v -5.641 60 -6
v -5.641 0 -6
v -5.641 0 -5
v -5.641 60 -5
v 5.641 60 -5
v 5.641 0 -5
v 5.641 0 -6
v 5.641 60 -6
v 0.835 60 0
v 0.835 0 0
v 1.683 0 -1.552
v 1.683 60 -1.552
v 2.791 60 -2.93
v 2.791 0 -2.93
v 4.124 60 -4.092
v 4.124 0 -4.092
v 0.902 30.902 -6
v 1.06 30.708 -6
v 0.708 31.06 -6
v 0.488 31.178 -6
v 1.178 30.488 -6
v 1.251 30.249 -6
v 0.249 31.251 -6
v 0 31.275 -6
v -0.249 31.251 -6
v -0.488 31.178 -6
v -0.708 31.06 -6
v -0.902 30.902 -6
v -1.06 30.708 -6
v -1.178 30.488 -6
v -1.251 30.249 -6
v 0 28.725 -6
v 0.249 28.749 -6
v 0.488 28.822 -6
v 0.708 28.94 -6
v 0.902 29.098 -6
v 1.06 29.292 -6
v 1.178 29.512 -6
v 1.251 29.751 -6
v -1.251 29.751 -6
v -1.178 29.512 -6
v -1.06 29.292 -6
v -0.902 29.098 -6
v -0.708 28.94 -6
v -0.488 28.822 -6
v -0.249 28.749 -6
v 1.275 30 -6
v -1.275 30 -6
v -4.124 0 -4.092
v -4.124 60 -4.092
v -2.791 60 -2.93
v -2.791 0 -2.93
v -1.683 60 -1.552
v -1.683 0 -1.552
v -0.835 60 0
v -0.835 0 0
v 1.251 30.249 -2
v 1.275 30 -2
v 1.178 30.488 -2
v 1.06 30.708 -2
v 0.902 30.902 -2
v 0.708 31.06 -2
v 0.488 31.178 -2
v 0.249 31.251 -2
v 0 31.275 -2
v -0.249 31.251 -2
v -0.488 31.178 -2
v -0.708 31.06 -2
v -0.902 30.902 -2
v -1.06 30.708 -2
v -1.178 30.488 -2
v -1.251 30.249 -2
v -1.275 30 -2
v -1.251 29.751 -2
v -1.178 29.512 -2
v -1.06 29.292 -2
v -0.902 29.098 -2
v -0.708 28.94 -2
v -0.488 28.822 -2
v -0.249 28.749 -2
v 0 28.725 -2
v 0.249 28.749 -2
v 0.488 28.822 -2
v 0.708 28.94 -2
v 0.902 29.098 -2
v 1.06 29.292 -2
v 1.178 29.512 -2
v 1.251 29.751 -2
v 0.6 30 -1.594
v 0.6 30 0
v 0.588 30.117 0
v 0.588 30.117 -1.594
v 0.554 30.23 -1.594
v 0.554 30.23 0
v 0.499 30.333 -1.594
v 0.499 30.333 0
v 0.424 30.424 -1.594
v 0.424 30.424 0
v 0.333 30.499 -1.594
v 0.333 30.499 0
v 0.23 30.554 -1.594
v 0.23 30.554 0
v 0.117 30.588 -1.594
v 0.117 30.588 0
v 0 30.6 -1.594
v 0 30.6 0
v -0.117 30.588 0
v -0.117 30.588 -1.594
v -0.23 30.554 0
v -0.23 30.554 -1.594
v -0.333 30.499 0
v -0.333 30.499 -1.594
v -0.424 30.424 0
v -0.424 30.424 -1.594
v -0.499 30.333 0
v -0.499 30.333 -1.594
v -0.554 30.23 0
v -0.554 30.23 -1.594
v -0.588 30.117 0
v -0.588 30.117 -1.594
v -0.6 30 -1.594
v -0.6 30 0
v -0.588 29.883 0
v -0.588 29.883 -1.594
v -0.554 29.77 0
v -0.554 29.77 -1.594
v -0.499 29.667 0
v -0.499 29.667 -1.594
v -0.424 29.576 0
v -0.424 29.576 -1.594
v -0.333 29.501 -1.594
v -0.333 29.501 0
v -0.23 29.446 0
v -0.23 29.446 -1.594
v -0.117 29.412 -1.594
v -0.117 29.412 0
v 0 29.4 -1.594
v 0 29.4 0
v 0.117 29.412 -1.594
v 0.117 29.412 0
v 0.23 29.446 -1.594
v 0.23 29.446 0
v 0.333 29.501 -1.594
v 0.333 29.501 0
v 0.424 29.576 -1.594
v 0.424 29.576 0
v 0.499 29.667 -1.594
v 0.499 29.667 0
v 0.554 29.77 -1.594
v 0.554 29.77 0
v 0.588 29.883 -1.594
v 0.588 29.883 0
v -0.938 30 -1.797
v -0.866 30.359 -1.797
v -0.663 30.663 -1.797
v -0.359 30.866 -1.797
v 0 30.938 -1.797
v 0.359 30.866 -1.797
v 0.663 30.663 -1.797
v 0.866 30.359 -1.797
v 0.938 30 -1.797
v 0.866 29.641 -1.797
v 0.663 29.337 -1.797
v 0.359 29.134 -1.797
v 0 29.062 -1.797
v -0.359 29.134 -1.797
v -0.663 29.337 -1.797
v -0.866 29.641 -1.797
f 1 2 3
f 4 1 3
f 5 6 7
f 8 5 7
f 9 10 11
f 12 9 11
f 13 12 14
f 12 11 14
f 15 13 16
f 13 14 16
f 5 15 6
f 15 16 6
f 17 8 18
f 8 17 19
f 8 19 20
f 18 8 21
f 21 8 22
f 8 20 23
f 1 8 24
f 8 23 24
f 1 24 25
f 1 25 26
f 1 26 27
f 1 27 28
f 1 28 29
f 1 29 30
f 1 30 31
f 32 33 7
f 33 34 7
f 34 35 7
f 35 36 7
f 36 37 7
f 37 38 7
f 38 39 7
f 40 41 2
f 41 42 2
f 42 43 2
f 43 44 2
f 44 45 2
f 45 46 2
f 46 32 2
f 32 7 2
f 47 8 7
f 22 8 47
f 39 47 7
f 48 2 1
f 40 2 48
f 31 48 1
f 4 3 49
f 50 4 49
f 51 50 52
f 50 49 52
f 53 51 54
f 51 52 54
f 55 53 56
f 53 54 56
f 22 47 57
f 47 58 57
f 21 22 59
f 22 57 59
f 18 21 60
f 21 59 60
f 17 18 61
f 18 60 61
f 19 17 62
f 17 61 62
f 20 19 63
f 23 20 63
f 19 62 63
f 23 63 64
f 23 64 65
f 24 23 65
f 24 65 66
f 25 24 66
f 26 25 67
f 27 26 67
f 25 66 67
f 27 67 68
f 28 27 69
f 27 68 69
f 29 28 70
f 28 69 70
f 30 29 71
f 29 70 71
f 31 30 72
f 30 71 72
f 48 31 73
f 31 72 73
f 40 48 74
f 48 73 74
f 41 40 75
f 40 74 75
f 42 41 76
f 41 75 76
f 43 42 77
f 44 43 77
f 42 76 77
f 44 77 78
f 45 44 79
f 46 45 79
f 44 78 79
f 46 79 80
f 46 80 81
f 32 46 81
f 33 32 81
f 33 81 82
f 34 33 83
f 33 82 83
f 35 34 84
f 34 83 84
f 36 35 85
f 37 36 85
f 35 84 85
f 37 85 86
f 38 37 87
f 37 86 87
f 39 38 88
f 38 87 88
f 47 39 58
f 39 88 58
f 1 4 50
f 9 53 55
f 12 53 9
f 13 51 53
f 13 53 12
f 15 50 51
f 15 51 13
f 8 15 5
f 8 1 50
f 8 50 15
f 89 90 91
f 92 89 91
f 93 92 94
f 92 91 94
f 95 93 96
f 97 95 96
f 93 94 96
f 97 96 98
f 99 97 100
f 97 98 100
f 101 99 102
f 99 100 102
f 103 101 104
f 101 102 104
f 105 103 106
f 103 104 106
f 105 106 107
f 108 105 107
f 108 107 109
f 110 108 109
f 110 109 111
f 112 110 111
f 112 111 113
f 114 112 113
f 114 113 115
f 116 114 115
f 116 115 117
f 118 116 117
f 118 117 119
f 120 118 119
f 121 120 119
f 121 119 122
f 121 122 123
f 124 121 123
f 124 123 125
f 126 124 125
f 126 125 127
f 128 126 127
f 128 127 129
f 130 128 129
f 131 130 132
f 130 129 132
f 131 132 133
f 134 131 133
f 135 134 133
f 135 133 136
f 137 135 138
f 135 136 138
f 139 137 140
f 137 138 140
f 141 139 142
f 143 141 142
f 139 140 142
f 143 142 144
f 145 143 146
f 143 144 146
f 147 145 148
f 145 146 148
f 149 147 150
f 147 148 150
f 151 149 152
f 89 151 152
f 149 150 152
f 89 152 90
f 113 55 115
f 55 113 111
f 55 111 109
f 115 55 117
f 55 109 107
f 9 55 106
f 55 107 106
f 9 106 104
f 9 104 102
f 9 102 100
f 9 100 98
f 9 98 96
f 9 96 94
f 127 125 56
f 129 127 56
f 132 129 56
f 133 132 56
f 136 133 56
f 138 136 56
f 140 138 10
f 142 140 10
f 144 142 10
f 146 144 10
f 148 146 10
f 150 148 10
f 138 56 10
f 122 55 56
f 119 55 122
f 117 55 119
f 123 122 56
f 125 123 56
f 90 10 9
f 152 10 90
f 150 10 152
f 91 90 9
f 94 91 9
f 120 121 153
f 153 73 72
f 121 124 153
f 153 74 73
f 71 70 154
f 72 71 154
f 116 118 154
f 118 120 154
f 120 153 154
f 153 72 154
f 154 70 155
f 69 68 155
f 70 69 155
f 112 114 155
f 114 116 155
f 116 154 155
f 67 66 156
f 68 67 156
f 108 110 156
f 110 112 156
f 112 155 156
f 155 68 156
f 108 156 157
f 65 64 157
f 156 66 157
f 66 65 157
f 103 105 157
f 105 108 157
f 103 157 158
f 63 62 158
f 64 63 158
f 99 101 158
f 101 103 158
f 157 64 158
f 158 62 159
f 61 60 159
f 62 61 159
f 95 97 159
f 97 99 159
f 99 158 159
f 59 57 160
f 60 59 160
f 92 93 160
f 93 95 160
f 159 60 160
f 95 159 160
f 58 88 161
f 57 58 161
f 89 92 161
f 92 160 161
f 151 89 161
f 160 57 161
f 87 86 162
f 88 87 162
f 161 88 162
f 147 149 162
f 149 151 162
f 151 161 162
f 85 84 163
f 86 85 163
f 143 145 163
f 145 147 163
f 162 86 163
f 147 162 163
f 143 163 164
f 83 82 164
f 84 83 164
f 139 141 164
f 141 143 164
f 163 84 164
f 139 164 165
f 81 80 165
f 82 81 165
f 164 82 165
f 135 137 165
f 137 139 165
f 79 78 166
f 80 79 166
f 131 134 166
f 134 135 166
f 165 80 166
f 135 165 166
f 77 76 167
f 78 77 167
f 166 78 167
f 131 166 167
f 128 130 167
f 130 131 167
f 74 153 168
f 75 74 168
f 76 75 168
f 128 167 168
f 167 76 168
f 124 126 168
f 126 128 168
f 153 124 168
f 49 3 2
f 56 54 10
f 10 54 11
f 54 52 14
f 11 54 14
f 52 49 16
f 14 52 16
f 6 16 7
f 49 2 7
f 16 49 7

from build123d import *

# Parameters (mm, degrees)
BOSS_EXTRUDE1_DEPTH                       = 60
TAPPED_HOLE_FOR_M2_5X0_45_HELICOIL1_D     = 2.55
TAPPED_HOLE_FOR_M2_5X0_45_HELICOIL1_DEPTH = 4
TAPPED_HOLE_FOR_M2_5X0_45_HELICOIL1_TIP   = 0.766097289
F_1_2_1_2_DIAMETER_HOLE1_D                = 1.2
F_1_2_1_2_DIAMETER_HOLE1_DEPTH            = 6.45
F_1_2_1_2_DIAMETER_HOLE1_TIP              = 0.360516371


with BuildPart() as part:
    # Sketch1 → Boss-Extrude1 (new body)
    with BuildSketch(Plane(origin=(0, 0, 0), x_dir=(1, 0, 0), z_dir=(0, 1, 0))):
        with BuildLine():
            Line((-0.83484861, 0), (0.83484861, 0))
            ThreePointArc((0.83484861, 0), (2.790632181, 2.930008344), (5.641101056, 5))
            Line((5.641101056, 5), (5.641101056, 6))
            Line((5.641101056, 6), (-5.641101056, 6))
            Line((-5.641101056, 6), (-5.641101056, 5))
            ThreePointArc((-5.641101056, 5), (-2.790632181, 2.930008344), (-0.83484861, 0))
        make_face()
    extrude(amount=BOSS_EXTRUDE1_DEPTH)

    # Tapped Hole for M2.5x0.45 Helicoil1
    with Locations(Plane(origin=(0, 30, -6), x_dir=(-1, 0, 0), z_dir=(0, 0, -1))):
        with Locations((0, 0)):
            Hole(TAPPED_HOLE_FOR_M2_5X0_45_HELICOIL1_D / 2, depth=TAPPED_HOLE_FOR_M2_5X0_45_HELICOIL1_DEPTH)
            with Locations((0, 0, -(TAPPED_HOLE_FOR_M2_5X0_45_HELICOIL1_DEPTH + TAPPED_HOLE_FOR_M2_5X0_45_HELICOIL1_TIP / 2))):  # 118° drill point
                Cone(0, TAPPED_HOLE_FOR_M2_5X0_45_HELICOIL1_D / 2, TAPPED_HOLE_FOR_M2_5X0_45_HELICOIL1_TIP, mode=Mode.SUBTRACT)

    # Ø1.2 (1.2) Diameter Hole1
    with Locations(Plane(origin=(0, 30, -6), x_dir=(-1, 0, 0), z_dir=(0, 0, -1))):
        with Locations((0, 0)):
            Hole(F_1_2_1_2_DIAMETER_HOLE1_D / 2, depth=F_1_2_1_2_DIAMETER_HOLE1_DEPTH)
            with Locations((0, 0, -(F_1_2_1_2_DIAMETER_HOLE1_DEPTH + F_1_2_1_2_DIAMETER_HOLE1_TIP / 2))):  # 118° drill point
                Cone(0, F_1_2_1_2_DIAMETER_HOLE1_D / 2, F_1_2_1_2_DIAMETER_HOLE1_TIP, mode=Mode.SUBTRACT)


solid = part.part
